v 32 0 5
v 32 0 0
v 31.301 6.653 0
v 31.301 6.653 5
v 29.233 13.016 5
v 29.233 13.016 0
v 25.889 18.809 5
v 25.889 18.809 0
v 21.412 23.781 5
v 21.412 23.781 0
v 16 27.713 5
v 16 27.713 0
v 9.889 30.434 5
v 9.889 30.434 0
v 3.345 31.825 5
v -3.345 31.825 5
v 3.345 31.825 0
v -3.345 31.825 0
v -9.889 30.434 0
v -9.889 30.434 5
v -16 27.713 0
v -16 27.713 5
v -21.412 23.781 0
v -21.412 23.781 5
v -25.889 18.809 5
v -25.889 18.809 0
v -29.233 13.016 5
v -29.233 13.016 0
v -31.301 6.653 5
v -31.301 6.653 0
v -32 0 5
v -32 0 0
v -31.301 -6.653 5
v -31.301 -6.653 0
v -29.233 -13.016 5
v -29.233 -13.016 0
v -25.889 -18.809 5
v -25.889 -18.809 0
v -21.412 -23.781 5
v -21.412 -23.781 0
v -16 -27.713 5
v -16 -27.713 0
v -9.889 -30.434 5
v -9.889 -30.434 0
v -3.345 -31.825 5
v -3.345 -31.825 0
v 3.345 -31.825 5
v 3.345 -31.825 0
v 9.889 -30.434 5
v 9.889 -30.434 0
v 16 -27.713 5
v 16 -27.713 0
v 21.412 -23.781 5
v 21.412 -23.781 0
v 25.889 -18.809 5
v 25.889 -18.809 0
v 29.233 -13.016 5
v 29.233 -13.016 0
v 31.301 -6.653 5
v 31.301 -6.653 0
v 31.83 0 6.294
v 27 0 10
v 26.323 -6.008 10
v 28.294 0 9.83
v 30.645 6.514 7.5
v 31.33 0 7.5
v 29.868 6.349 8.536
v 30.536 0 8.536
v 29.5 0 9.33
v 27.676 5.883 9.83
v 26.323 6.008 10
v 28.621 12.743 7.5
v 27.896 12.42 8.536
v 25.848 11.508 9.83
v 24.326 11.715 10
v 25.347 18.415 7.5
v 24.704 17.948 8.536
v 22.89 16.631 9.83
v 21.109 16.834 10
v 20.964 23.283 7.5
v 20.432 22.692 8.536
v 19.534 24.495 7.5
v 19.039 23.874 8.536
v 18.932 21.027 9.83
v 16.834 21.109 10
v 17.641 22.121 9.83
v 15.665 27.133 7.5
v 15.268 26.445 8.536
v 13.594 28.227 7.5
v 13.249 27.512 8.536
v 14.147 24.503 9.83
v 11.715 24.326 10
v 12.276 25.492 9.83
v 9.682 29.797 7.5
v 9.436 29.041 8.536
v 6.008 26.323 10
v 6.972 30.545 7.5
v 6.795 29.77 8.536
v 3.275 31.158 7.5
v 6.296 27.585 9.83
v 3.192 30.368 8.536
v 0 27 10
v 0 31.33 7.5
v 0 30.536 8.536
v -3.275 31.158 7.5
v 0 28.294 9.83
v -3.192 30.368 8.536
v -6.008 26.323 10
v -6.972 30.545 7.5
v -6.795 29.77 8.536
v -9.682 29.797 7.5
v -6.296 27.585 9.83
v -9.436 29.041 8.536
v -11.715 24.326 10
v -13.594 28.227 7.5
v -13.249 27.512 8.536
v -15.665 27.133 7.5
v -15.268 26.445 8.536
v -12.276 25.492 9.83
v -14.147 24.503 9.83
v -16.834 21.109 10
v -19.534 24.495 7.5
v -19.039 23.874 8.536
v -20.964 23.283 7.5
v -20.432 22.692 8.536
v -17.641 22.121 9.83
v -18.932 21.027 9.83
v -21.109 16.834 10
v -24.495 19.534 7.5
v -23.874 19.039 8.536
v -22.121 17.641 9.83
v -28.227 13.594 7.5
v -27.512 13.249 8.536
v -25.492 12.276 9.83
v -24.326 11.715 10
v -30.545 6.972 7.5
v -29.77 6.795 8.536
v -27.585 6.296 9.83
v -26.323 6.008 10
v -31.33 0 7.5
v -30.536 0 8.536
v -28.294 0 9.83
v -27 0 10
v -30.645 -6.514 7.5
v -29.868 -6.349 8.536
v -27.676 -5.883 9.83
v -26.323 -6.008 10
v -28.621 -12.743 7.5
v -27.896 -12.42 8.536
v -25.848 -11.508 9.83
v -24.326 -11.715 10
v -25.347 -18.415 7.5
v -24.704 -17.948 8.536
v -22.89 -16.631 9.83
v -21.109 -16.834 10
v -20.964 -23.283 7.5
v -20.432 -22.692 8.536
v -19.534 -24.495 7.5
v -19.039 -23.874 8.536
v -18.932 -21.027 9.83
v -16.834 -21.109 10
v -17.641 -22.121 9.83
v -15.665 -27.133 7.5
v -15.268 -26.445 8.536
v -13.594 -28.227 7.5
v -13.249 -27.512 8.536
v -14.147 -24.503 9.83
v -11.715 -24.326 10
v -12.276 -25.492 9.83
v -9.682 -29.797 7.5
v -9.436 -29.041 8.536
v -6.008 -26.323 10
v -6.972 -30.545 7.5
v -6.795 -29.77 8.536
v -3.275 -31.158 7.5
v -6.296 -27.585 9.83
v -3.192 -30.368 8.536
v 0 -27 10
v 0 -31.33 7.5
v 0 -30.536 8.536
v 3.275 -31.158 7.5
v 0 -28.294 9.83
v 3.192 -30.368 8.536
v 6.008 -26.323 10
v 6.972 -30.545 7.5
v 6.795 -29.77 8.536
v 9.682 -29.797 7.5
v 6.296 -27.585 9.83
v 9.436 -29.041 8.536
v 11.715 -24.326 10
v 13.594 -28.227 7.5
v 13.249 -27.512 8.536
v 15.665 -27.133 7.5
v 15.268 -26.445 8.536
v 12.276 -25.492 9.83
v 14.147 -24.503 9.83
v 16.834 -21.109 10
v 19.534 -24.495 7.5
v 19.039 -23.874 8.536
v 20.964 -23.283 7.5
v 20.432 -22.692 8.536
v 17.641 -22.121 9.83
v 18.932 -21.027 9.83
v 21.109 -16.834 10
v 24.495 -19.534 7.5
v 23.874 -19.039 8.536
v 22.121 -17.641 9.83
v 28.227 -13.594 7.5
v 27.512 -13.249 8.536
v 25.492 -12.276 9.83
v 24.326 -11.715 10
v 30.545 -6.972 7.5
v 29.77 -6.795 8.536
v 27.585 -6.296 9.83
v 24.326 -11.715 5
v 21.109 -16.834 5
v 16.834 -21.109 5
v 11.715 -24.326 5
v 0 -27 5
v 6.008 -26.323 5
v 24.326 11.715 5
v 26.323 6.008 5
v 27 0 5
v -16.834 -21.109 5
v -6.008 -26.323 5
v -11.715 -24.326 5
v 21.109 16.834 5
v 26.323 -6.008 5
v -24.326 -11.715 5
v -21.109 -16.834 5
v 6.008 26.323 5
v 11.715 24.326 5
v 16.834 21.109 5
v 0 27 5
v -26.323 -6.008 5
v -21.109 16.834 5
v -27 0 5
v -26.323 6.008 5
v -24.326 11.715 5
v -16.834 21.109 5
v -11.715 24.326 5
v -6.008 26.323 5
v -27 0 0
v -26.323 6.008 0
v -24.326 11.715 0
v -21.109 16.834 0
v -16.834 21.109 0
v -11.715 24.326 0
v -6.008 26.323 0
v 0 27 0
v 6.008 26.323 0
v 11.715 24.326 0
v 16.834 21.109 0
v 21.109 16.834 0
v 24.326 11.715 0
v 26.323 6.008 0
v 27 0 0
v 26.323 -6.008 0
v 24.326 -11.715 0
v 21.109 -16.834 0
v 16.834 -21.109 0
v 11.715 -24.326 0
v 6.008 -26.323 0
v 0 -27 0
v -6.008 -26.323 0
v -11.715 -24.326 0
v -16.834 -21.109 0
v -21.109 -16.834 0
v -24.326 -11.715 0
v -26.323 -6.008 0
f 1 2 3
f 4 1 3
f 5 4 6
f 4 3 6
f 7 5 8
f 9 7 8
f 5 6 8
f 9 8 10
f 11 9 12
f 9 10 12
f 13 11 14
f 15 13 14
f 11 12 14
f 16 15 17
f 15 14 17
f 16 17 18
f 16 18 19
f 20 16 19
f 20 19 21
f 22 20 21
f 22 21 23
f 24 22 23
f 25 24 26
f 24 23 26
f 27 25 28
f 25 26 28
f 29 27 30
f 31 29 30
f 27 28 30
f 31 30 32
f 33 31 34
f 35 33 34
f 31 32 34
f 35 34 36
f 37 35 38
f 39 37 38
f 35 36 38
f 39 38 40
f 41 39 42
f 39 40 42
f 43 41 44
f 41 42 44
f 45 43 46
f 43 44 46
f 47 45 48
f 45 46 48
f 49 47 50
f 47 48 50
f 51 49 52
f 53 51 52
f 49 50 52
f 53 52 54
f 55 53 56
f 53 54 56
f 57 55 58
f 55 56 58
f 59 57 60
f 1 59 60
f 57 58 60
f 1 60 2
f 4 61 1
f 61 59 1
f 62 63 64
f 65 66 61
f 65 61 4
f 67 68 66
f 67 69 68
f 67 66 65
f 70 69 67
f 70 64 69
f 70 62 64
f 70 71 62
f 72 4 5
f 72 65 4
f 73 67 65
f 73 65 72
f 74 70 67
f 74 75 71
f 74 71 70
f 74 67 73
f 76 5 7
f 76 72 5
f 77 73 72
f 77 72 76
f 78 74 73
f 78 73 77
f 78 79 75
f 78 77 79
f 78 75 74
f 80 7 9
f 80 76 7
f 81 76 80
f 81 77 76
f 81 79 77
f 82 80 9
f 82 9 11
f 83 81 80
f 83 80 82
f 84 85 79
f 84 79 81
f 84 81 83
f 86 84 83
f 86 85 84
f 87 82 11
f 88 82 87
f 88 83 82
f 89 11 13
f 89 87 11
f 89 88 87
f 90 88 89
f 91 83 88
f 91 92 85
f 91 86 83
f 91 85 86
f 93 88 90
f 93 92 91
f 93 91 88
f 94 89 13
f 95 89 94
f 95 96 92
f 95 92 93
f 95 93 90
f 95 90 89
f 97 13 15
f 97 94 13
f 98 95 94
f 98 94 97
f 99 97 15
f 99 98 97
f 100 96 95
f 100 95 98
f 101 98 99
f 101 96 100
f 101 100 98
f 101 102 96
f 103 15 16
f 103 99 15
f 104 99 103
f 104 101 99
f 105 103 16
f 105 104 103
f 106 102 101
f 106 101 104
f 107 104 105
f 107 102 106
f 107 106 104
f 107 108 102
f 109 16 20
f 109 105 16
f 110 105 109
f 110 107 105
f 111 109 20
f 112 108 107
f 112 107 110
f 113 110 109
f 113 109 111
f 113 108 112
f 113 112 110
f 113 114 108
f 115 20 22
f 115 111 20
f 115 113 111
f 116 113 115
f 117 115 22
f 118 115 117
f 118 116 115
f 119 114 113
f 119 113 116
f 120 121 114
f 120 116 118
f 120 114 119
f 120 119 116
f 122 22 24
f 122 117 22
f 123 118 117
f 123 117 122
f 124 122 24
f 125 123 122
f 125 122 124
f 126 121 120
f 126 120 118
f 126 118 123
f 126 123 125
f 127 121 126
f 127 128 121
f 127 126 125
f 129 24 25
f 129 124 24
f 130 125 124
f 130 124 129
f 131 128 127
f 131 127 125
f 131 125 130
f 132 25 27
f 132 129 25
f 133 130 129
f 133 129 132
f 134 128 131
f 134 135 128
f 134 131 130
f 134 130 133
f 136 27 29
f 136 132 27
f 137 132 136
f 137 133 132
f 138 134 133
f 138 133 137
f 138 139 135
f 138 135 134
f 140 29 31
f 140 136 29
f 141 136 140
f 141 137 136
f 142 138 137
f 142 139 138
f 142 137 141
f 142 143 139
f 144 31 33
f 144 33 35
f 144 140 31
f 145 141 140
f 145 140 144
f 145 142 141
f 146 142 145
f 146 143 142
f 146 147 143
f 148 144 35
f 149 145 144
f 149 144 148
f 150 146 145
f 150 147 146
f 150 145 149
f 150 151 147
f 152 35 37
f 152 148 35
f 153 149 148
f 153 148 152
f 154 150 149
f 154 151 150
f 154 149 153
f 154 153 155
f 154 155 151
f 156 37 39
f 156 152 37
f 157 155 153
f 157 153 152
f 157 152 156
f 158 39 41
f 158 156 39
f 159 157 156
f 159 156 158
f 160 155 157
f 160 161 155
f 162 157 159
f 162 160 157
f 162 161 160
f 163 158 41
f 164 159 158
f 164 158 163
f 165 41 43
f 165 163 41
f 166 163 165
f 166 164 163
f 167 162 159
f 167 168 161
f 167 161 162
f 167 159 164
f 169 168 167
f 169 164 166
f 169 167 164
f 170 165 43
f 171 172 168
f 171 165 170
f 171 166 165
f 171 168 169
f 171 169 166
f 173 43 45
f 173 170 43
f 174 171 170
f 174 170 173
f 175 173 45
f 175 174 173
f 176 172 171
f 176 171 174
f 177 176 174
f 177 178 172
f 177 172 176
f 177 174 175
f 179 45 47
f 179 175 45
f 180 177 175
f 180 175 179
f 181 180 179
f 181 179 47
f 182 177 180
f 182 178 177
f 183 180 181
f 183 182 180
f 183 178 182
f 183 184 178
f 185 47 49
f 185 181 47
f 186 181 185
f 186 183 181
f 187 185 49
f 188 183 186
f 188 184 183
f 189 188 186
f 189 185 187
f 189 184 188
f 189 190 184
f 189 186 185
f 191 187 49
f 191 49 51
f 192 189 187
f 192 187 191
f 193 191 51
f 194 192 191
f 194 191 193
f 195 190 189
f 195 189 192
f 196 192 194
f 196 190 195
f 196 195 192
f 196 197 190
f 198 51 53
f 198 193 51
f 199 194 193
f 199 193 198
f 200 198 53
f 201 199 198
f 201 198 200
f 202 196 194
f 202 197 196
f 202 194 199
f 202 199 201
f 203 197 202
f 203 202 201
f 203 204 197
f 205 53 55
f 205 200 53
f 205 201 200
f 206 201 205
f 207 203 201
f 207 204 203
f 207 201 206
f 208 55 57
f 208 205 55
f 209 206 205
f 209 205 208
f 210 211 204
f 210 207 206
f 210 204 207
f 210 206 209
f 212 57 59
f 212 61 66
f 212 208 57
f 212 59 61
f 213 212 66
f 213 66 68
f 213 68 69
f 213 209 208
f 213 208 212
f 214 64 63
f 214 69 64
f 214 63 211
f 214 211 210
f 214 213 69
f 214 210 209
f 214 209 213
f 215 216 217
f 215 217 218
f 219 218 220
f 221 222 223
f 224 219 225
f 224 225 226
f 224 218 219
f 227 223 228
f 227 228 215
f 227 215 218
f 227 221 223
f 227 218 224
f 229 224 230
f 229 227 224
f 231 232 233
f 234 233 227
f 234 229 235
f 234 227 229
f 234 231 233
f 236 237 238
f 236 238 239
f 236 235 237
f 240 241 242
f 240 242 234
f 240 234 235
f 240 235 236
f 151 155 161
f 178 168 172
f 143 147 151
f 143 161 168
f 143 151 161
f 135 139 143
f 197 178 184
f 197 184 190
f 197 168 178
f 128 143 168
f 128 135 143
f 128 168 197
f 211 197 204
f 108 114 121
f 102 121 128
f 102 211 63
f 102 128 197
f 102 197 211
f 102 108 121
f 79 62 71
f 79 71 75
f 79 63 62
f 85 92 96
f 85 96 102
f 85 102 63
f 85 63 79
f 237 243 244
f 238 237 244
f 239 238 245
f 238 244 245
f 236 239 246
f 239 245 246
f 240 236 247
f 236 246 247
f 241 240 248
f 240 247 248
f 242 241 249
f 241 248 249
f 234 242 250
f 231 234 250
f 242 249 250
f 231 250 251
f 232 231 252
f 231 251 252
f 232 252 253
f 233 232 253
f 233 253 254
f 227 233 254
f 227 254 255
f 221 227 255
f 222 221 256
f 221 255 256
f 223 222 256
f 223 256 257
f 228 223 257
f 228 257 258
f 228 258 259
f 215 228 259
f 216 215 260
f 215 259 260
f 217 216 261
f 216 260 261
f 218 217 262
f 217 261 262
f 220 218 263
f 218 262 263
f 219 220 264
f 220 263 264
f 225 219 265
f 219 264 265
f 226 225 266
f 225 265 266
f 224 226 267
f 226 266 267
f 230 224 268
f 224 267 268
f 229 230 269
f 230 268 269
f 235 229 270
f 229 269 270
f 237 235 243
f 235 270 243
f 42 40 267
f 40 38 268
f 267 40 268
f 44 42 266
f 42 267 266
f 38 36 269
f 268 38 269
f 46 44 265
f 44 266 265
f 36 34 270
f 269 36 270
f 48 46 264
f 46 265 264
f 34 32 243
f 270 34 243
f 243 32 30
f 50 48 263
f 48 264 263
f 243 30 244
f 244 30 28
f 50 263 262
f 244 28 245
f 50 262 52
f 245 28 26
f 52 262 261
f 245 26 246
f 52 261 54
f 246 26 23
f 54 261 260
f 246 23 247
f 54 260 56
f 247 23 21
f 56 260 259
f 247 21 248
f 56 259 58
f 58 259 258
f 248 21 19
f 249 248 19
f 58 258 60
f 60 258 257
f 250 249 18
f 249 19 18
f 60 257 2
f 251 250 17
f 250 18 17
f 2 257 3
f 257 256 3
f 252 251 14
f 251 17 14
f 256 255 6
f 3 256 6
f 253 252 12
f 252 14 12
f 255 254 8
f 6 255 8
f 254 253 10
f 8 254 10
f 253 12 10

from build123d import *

# Parameters (mm, degrees)
ESBO_O1_R                = 32
RESSALTO_EXTRUS_O1_DEPTH = 10
FILETE1_R                = 5
ESBO_O2_R                = 27
CORTE_EXTRUS_O1_DEPTH    = 5


with BuildPart() as part:
    # Esboço1 → Ressalto-extrusão1 (new body)
    with BuildSketch(Plane.XY):
        Circle(ESBO_O1_R)
    extrude(amount=RESSALTO_EXTRUS_O1_DEPTH)

    # Filete1
    filete1_edges = [part.edges().sort_by_distance(p)[0] for p in [
        (-32, 0, 10),
    ]]
    fillet(filete1_edges, radius=FILETE1_R)

    # Esboço2 → Corte-extrusão1 (cut)
    with BuildSketch(Plane(origin=(0, 0, 0), x_dir=(-1, 0, 0), z_dir=(0, 0, -1))):
        Circle(ESBO_O2_R)
    extrude(amount=-CORTE_EXTRUS_O1_DEPTH, mode=Mode.SUBTRACT)


solid = part.part
